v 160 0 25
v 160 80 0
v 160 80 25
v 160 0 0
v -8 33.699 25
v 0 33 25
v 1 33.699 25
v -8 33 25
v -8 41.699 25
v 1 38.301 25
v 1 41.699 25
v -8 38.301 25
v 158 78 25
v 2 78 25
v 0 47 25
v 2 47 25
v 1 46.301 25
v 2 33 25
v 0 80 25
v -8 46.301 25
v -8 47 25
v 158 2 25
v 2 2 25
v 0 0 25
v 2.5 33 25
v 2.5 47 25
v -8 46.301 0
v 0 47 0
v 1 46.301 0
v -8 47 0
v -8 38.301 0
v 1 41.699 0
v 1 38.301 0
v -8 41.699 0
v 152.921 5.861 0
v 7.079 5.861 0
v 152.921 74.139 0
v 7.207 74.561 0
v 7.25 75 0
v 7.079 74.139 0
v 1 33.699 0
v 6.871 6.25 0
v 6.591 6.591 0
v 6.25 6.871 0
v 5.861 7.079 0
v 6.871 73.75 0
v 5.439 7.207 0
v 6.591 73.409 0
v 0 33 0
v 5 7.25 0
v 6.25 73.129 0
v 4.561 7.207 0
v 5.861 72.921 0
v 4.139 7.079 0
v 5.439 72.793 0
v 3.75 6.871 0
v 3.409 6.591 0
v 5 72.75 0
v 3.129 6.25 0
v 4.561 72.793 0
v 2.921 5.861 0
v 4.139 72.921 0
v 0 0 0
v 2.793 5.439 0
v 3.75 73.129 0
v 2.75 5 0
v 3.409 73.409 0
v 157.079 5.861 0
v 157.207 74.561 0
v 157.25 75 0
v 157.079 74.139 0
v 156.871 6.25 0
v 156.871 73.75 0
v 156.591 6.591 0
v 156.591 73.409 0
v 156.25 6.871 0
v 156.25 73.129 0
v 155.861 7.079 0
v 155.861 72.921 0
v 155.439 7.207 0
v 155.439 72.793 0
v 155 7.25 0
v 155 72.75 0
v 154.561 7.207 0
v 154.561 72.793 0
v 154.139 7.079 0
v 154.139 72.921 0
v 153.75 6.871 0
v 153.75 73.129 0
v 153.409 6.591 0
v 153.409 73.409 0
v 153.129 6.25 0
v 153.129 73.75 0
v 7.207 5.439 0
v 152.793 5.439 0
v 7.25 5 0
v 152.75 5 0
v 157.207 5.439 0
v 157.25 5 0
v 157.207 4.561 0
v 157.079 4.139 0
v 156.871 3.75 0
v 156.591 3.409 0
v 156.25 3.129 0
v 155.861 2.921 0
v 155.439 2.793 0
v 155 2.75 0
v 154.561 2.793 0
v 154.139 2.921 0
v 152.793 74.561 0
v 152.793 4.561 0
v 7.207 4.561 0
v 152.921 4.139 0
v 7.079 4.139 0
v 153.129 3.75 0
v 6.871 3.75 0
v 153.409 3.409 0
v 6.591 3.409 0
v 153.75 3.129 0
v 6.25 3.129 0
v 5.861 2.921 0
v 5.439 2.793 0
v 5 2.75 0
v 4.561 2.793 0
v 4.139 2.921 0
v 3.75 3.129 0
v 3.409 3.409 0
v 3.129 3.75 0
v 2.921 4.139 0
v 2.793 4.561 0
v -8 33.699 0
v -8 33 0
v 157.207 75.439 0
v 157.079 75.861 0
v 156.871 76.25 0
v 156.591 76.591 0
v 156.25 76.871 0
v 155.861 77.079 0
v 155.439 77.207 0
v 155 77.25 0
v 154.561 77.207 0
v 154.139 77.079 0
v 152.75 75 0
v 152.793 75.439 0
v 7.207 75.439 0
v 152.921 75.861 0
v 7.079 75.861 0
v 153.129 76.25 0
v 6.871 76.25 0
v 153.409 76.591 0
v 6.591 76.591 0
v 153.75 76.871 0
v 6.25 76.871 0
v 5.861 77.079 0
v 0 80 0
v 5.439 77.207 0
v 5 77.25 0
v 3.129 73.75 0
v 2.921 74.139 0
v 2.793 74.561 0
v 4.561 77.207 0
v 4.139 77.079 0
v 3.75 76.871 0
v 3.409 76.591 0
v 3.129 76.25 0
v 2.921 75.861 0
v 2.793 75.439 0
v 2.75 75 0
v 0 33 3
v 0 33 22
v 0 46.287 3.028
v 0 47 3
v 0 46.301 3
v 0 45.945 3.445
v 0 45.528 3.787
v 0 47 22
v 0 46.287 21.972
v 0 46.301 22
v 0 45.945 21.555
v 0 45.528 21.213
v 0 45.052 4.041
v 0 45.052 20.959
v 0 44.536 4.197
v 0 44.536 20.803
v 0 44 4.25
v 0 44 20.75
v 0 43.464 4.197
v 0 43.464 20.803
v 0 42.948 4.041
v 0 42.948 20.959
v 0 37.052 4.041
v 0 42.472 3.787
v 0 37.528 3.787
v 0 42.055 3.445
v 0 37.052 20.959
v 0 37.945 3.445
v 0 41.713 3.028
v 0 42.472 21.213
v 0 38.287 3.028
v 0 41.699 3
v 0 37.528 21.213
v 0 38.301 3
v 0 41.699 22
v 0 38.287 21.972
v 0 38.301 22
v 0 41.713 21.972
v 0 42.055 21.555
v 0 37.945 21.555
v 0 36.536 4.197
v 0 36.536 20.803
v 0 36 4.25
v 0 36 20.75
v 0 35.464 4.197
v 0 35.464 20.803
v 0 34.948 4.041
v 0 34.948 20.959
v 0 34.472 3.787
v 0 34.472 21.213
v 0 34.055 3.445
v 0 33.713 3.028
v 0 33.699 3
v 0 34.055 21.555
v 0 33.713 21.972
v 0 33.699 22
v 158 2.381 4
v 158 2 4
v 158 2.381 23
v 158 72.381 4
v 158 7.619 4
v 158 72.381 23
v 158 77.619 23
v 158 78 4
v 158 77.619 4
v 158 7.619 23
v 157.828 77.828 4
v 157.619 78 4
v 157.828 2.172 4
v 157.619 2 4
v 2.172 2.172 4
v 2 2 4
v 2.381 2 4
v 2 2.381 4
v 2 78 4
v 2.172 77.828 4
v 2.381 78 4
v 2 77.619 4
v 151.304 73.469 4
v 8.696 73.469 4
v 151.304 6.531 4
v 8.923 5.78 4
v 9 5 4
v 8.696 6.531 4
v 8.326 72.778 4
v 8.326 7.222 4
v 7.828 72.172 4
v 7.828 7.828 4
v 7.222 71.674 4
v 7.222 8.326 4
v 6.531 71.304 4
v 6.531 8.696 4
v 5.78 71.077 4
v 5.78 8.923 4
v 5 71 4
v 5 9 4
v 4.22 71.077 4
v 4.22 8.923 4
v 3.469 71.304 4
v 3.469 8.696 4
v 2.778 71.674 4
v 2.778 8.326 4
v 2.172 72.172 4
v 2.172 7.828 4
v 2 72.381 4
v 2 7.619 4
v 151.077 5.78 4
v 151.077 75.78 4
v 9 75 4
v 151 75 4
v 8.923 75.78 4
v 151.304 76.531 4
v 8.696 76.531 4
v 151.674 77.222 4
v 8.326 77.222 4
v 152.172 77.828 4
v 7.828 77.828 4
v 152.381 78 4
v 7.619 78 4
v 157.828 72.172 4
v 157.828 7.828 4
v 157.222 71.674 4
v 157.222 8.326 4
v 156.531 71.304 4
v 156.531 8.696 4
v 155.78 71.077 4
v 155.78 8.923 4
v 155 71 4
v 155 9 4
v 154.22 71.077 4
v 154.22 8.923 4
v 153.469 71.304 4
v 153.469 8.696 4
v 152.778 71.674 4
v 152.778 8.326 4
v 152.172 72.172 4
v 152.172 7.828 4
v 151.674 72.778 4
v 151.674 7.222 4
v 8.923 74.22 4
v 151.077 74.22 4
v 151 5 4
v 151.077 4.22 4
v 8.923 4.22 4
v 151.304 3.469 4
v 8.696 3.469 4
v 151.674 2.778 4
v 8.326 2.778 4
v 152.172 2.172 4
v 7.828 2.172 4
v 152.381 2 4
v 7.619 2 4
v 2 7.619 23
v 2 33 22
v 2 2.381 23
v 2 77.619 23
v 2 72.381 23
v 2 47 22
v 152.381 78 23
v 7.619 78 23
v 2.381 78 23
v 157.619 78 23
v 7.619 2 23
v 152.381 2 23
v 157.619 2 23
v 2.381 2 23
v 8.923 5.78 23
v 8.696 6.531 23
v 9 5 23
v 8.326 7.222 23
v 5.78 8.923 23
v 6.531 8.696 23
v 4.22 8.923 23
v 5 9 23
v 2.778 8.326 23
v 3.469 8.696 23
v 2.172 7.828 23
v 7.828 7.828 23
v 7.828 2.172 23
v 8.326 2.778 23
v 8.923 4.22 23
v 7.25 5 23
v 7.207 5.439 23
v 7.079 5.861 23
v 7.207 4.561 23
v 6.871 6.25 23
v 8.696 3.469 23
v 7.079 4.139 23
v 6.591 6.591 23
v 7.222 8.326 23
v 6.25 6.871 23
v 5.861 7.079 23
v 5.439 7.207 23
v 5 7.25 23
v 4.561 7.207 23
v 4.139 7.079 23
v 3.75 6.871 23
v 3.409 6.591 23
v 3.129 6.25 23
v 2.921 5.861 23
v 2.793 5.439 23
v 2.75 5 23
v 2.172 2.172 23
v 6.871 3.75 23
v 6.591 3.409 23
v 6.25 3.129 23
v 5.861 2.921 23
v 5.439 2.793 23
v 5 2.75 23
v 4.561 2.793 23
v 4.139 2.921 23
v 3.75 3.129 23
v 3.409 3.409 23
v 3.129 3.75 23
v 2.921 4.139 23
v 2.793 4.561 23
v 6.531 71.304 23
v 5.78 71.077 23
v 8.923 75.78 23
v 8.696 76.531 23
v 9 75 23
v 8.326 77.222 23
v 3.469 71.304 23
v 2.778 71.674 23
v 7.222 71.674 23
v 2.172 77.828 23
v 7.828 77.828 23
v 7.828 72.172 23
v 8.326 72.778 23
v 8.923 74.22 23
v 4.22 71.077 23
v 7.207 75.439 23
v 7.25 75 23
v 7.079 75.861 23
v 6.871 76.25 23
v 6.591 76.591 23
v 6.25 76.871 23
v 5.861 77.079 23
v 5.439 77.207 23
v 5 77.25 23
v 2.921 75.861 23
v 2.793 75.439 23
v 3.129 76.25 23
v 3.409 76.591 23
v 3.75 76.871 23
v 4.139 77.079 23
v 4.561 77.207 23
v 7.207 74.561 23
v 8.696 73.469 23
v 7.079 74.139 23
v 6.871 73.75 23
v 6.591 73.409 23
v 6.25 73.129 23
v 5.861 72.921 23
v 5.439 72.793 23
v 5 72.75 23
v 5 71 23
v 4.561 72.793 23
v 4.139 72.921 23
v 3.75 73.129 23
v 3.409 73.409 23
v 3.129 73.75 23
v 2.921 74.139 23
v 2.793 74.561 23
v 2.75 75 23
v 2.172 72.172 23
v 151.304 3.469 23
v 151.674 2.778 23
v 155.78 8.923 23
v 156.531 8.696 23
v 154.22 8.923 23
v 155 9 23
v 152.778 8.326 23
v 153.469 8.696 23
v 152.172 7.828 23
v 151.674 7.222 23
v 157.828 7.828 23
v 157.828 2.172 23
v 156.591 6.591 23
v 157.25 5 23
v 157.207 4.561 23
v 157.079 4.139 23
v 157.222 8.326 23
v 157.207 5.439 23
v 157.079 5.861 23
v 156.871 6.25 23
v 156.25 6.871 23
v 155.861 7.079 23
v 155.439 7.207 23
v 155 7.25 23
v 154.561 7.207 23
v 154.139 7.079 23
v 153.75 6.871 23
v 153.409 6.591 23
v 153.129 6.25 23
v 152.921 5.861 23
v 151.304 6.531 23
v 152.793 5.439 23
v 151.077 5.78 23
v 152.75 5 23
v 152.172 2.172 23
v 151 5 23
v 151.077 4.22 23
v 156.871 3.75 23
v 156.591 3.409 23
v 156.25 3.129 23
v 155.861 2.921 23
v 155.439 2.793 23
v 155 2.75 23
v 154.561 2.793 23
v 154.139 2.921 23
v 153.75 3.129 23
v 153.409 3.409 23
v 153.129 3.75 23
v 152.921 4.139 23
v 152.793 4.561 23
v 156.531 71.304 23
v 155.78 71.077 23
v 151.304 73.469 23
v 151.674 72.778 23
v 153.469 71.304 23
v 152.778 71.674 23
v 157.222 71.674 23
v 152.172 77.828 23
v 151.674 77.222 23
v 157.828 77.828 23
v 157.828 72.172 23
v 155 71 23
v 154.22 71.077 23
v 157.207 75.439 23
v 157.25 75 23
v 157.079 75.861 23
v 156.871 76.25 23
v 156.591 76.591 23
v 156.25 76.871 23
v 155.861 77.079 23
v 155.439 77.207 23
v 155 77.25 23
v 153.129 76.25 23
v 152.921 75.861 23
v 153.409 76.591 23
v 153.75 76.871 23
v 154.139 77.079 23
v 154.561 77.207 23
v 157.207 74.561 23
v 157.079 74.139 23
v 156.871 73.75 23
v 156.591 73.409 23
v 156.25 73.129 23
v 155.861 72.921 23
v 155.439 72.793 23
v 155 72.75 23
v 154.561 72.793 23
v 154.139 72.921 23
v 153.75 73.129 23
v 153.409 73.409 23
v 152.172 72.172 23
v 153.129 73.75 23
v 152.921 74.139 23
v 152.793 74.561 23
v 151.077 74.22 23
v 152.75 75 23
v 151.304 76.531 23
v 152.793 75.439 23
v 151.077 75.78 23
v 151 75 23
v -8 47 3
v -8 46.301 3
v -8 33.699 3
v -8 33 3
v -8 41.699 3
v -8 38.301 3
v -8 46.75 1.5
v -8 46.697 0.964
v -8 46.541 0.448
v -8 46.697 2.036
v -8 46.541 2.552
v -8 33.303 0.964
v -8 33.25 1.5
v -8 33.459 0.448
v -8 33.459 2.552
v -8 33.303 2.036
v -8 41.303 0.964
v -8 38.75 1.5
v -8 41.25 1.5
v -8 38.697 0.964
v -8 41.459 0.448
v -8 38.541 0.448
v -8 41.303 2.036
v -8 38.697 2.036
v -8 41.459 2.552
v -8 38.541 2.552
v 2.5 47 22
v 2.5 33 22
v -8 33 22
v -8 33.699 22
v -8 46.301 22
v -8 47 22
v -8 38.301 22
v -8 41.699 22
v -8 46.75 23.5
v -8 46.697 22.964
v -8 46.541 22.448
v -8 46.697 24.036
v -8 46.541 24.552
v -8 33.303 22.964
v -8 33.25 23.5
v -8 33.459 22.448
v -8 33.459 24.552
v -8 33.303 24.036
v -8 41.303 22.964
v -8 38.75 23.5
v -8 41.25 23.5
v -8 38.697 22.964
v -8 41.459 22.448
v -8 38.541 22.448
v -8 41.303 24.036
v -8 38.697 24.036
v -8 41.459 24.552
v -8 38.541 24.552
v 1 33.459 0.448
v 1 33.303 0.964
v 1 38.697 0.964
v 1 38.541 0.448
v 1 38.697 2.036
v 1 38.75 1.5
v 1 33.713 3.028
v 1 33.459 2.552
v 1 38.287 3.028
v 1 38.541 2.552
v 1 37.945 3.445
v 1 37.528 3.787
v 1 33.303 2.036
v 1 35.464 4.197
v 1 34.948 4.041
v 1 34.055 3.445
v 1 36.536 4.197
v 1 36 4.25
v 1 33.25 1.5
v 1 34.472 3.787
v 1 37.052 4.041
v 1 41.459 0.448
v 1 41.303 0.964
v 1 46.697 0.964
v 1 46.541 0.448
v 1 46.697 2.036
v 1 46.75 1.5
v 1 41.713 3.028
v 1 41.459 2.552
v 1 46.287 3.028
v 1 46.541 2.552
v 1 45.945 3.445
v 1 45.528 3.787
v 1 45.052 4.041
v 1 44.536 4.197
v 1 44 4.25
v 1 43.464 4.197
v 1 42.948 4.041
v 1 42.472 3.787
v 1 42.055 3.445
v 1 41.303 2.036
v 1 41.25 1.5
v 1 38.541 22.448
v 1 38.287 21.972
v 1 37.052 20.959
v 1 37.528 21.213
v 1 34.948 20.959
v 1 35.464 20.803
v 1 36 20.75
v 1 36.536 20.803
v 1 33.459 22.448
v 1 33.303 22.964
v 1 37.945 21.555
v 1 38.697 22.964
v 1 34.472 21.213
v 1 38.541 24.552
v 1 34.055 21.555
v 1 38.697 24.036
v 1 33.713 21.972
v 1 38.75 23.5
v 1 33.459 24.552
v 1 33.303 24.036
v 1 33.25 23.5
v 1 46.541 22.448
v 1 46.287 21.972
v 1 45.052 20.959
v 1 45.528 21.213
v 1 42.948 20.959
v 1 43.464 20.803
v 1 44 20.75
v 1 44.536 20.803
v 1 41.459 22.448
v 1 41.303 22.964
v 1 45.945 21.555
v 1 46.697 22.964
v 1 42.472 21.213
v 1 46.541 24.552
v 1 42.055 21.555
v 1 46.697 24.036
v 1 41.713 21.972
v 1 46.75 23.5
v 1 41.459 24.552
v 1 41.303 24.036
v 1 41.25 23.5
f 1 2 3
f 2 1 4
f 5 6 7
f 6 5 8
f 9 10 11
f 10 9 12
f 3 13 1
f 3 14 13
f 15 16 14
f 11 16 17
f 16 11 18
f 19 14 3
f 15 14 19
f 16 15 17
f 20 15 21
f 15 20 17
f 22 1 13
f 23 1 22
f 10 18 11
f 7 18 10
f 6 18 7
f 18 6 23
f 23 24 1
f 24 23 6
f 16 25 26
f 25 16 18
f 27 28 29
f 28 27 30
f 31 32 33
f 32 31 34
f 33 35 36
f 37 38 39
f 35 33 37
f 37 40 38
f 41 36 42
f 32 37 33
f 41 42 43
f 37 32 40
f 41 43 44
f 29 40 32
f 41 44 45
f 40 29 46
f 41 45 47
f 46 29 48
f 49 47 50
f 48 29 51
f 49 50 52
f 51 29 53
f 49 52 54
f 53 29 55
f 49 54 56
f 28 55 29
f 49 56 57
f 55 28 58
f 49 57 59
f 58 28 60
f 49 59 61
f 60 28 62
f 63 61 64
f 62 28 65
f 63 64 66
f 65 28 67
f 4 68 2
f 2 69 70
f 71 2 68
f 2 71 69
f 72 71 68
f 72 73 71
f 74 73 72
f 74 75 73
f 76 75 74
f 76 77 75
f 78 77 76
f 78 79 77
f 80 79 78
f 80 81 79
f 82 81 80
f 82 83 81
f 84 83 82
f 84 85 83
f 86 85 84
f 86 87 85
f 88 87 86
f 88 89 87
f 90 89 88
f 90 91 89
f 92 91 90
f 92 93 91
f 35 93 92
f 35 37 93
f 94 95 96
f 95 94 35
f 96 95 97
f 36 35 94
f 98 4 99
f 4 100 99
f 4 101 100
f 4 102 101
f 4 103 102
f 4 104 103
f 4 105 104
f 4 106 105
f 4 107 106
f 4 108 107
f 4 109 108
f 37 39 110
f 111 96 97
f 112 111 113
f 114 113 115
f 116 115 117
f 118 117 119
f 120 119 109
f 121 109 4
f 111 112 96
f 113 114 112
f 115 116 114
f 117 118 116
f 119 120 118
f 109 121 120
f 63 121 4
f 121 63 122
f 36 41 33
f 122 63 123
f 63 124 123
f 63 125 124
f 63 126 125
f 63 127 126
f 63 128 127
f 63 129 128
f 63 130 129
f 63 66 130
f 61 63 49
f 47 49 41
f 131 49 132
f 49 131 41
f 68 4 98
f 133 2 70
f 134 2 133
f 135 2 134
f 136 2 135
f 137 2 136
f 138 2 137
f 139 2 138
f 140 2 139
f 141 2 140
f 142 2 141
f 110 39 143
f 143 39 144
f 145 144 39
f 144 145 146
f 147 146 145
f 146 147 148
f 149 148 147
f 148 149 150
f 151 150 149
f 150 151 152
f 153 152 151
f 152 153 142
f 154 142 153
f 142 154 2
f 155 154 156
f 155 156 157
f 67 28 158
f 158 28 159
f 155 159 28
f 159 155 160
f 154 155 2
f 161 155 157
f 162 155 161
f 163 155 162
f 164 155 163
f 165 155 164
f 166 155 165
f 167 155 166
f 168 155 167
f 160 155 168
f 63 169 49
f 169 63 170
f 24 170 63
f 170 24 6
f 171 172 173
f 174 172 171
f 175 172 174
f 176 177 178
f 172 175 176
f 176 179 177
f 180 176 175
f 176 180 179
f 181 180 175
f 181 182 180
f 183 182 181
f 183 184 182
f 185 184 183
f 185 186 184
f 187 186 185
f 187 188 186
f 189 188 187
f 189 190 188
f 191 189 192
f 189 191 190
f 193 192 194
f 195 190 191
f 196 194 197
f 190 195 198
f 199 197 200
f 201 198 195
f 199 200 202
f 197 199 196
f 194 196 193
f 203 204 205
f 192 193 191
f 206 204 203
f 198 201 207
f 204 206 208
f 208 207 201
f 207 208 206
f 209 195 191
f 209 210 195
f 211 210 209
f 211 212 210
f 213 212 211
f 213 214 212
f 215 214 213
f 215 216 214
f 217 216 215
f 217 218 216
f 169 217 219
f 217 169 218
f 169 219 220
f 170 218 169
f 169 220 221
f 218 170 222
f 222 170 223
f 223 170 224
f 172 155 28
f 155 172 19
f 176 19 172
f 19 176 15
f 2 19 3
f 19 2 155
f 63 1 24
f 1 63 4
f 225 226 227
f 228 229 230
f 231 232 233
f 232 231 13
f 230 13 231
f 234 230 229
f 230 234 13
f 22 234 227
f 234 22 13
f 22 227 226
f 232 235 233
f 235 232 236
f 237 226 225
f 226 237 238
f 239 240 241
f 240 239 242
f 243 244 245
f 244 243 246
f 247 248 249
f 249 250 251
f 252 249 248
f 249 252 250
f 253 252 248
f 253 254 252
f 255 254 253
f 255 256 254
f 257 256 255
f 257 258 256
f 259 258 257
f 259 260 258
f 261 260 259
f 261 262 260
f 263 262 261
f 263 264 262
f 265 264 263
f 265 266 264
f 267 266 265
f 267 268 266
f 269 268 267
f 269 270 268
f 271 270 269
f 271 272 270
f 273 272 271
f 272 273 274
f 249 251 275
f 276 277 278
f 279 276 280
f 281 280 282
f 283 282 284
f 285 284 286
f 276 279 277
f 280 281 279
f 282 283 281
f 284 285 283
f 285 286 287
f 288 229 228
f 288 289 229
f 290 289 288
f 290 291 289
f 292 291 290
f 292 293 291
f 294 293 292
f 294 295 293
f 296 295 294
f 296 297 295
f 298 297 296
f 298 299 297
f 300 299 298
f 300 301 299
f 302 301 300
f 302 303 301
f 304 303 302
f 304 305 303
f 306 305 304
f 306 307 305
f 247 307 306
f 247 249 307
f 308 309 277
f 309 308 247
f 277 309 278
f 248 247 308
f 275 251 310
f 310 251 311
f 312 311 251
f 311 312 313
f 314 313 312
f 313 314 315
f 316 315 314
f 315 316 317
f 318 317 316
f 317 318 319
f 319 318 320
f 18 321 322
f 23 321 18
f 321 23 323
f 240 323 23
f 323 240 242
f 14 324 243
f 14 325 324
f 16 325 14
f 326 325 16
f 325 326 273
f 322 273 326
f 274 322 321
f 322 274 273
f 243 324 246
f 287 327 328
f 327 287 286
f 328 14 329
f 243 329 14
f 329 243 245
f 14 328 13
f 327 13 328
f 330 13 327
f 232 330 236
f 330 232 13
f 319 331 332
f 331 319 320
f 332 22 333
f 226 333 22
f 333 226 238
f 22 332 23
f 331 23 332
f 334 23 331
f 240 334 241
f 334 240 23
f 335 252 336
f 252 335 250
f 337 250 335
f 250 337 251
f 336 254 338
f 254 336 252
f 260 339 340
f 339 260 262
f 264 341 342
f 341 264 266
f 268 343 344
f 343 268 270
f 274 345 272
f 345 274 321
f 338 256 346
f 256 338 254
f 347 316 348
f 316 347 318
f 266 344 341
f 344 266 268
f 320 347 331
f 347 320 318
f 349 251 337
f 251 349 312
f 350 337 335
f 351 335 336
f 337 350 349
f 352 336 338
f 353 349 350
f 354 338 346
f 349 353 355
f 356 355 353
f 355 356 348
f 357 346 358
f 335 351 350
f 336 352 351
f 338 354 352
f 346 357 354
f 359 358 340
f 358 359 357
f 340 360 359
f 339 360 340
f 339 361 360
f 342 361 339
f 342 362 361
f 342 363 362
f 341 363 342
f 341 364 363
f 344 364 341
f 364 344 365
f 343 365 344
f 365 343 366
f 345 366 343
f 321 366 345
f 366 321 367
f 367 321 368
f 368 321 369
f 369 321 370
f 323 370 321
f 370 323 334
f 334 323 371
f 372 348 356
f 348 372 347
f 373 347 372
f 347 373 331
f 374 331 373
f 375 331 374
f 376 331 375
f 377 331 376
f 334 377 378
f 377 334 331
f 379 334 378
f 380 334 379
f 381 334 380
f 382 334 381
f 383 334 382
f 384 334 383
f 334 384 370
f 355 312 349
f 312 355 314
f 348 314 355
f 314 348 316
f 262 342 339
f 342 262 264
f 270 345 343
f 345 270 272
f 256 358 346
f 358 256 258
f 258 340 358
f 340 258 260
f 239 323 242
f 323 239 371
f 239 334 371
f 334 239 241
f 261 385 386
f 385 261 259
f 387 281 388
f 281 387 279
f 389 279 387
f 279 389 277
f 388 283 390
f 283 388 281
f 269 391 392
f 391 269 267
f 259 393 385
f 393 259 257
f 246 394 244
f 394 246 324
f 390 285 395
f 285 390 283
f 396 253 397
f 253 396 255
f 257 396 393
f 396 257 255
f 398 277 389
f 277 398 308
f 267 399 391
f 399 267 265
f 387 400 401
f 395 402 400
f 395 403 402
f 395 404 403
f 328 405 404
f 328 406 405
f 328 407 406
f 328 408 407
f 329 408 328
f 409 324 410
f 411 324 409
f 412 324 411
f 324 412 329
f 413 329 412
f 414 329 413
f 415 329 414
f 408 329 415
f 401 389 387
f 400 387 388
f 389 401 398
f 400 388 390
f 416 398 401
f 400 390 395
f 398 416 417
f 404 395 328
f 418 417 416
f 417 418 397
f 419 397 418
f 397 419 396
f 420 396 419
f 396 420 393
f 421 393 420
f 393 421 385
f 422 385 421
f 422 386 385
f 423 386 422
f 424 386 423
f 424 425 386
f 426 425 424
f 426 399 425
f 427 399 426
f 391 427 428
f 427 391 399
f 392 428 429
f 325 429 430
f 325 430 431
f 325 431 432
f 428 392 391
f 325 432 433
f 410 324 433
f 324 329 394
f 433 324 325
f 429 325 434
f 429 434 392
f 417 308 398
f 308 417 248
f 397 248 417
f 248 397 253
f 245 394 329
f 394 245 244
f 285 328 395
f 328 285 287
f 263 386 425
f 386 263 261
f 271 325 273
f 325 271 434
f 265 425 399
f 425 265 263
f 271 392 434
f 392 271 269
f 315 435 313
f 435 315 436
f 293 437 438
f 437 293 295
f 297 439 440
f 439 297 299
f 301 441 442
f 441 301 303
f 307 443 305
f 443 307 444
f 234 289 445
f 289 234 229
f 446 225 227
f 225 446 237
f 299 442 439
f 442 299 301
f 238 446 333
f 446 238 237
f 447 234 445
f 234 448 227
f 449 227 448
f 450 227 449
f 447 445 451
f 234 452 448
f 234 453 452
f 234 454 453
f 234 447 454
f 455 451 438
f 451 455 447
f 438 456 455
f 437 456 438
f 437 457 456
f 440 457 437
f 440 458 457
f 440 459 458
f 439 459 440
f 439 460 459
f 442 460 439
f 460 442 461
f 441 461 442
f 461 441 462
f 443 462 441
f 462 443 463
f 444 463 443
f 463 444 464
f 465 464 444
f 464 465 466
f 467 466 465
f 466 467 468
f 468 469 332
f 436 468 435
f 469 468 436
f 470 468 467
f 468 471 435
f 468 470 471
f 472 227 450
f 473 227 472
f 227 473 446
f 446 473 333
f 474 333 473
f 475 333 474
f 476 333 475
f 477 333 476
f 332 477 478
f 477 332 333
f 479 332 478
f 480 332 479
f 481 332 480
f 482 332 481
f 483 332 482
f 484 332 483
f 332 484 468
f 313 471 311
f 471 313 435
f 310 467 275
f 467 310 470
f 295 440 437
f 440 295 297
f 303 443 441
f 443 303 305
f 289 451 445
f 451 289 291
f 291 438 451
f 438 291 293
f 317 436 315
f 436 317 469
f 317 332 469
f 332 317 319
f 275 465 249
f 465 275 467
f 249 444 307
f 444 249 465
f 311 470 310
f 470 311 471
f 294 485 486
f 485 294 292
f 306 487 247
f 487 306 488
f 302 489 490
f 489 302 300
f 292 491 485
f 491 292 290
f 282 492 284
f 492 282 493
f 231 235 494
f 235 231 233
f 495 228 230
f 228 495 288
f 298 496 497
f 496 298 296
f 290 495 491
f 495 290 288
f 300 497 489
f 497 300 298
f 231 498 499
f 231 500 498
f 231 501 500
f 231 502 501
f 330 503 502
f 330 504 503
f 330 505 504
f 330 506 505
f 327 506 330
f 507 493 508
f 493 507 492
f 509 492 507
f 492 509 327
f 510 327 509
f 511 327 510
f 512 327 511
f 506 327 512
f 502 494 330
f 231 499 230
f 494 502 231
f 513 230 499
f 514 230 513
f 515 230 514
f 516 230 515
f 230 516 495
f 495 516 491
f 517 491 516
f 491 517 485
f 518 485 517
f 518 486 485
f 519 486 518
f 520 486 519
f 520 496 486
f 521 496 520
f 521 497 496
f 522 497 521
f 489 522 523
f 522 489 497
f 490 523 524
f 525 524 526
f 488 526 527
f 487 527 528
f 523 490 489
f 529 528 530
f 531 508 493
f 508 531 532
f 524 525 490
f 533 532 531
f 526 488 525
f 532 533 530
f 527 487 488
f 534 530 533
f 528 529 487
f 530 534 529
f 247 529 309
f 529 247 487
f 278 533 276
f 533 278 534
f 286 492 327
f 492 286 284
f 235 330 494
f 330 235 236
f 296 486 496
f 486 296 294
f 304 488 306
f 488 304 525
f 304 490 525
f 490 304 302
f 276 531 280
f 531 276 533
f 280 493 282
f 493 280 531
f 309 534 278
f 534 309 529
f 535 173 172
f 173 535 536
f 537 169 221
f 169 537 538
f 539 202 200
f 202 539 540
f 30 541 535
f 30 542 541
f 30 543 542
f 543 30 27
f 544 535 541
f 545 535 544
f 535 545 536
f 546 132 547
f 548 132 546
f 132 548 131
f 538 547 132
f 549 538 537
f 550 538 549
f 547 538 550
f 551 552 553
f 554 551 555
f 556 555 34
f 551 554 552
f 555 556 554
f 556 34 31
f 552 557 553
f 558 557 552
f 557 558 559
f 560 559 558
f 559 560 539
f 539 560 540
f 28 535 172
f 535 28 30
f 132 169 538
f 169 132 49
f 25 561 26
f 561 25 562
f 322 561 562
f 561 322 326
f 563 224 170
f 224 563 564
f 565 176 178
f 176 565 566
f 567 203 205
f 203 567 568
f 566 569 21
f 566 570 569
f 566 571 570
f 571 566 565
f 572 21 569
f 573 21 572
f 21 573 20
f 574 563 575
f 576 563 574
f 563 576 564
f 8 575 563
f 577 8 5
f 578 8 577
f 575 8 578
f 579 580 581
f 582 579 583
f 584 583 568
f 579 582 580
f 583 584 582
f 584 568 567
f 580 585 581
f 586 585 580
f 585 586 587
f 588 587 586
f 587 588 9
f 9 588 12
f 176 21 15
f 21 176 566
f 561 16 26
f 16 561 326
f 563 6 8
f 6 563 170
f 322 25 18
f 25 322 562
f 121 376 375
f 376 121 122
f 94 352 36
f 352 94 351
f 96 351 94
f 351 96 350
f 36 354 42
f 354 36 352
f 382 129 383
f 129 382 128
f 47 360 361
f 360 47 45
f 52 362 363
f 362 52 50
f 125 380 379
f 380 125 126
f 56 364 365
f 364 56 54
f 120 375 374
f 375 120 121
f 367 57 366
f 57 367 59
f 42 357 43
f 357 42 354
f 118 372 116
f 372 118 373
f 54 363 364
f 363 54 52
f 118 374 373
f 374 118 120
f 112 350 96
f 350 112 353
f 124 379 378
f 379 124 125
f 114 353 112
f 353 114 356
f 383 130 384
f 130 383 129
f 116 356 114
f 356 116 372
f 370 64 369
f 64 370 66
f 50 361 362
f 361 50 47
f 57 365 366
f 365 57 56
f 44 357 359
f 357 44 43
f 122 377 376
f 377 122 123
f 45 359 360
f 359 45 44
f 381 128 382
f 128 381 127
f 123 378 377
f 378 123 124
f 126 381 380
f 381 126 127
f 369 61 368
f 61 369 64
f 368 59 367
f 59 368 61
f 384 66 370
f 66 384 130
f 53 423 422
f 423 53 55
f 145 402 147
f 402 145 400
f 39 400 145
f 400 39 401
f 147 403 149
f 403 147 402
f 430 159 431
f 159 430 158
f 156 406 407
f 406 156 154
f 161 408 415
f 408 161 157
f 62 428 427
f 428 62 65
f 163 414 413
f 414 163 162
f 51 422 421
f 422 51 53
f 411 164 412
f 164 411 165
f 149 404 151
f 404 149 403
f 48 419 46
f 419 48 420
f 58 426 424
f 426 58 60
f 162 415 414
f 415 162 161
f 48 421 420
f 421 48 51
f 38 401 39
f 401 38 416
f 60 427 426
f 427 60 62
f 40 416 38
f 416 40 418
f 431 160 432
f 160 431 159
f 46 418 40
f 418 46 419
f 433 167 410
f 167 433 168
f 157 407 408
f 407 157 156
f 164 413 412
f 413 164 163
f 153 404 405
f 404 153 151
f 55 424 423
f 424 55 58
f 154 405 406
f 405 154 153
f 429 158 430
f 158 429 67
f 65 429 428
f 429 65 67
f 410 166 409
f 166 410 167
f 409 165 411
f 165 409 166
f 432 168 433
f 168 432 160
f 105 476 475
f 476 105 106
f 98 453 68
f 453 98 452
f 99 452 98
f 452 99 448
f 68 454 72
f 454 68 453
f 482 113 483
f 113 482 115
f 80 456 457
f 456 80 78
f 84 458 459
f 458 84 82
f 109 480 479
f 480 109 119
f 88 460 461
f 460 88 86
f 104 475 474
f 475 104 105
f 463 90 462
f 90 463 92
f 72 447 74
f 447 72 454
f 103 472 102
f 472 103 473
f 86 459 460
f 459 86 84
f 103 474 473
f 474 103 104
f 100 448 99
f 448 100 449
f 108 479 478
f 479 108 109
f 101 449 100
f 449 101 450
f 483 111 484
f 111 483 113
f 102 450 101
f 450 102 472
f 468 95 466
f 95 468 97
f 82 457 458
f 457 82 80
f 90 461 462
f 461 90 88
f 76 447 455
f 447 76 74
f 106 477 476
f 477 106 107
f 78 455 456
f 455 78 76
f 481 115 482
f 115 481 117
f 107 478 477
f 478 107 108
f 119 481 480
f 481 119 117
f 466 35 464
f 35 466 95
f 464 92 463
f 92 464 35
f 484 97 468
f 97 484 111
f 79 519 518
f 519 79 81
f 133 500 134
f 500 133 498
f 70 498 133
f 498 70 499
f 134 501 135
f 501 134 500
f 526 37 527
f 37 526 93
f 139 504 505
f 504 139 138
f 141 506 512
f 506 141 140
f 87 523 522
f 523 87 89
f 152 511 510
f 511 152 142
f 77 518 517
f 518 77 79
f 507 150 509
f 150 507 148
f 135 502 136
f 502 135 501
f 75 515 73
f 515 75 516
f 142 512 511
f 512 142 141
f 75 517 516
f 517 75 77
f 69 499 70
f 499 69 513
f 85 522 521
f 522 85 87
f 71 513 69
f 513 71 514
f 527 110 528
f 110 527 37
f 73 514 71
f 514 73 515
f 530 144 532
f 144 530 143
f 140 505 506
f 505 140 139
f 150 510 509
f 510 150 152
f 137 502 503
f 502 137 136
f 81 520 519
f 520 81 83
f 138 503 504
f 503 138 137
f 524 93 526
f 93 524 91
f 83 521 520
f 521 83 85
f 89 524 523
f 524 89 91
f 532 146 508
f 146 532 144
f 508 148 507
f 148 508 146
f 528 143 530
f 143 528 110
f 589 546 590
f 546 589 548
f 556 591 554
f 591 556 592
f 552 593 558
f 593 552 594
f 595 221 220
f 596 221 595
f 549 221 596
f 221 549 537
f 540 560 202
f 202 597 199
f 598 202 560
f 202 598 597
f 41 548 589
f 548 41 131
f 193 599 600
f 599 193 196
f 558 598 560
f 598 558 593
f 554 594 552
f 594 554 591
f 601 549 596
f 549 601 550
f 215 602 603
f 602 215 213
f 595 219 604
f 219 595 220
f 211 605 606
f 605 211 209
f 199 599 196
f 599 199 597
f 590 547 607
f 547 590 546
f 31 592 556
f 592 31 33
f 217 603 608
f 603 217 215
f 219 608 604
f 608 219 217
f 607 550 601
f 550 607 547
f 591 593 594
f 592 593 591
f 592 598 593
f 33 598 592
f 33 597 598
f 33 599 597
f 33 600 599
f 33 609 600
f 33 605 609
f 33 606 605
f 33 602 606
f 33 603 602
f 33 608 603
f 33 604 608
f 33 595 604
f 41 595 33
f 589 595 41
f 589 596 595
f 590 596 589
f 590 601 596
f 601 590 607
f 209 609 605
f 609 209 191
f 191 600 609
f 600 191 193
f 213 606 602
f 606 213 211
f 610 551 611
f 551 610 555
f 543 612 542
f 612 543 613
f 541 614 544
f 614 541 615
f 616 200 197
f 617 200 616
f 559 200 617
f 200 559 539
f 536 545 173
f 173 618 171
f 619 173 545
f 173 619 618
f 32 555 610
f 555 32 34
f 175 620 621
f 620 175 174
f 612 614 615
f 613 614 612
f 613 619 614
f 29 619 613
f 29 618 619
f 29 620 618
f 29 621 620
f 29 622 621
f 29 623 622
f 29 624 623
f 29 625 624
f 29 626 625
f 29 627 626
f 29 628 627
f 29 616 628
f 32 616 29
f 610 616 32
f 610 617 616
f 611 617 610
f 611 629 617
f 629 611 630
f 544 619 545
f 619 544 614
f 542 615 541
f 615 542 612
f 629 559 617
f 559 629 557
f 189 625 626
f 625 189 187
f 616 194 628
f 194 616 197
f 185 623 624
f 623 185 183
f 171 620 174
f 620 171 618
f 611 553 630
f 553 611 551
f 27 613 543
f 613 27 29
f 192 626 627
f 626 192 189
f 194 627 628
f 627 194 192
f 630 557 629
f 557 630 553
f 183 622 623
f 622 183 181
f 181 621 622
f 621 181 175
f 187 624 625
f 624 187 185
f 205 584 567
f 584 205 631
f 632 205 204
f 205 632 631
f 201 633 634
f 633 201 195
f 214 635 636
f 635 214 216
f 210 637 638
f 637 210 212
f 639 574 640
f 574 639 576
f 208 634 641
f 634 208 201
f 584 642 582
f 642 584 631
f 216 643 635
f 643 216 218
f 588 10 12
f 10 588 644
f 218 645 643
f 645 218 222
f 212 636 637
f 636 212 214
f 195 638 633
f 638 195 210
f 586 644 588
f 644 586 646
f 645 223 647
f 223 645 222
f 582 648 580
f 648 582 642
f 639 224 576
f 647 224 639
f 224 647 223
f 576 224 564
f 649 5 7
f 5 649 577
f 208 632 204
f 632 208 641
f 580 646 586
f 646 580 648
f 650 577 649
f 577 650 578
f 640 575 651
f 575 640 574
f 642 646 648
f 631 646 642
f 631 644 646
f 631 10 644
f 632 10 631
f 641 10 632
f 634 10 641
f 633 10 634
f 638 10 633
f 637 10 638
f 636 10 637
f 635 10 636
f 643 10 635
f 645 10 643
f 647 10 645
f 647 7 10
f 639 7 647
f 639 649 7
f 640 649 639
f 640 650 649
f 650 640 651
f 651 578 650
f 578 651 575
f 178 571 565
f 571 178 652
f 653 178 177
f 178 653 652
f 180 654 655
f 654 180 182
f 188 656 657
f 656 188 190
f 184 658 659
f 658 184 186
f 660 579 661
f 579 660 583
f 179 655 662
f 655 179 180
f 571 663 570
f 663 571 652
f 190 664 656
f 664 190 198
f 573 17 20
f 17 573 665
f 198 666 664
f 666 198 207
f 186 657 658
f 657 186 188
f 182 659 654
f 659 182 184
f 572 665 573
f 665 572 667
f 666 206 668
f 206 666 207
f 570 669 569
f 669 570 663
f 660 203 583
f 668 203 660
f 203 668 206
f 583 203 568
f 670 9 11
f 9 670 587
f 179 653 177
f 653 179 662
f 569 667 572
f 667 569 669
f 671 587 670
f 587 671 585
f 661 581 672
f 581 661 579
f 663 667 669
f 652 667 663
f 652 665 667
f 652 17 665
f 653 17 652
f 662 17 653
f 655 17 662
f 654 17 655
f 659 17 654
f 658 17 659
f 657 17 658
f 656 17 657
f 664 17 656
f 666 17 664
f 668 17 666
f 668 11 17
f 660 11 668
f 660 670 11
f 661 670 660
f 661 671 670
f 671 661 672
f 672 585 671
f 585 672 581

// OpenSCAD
$fn = 32;

// ----------------------------------------------------------------------
// Enclosure body: 160 x 80 x 25 mm, wall 2 mm
// ----------------------------------------------------------------------

// --- parameters (mm) ---
length = 160;             // outside length, X
width = 80;               // outside width, Y
height = 25;              // outside height, Z
wall = 2;                 // side wall thickness
floor_t = 4;              // floor thickness
boss_d = 8;               // corner boss diameter
boss_h = 19;              // corner boss height above the floor
boss_hole_d = 4.5;        // lid screw clearance in the boss
boss_lip = 5;             // boss centre inset from the corner
ear_w = 14;               // mounting ear width
ear_t = 3;                // mounting ear thickness
ear_ext = 8;              // mounting ear reach
ear_hole_d = 5.5;         // mounting ear drills

module shell() {
  difference() {
    cube([length, width, height]);
    /* hollow, open at the top */
    translate([wall, wall, floor_t])
      cube([length - 2 * wall, width - 2 * wall, height]);
  }
}

module bosses() {
  /* corner bosses, sunk 1 mm into the floor */
  for (sx = [0, 1]) for (sy = [0, 1])
    translate([sx * (length - 2 * boss_lip) + boss_lip, sy * (width - 2 * boss_lip) + boss_lip, floor_t - 1])
      cylinder(h = boss_h + 1, d = boss_d);
}

module ears() {
  /* mounting ears on the short walls, sunk into the wall */
  for (sz = [0, 1])
    translate([-ear_ext, width / 2 - ear_w / 2, sz * (height - ear_t)])
      cube([ear_ext + 2.5, ear_w, ear_t]);
}

difference() {
  union() {
    shell();
    bosses();
    ears();
  }
  /* boss screw holes */
  for (sx = [0, 1]) for (sy = [0, 1])
    translate([sx * (length - 2 * boss_lip) + boss_lip, sy * (width - 2 * boss_lip) + boss_lip, -1]) cylinder(h = floor_t + boss_h + 2, d = boss_hole_d);
  for (sz = [0, 1]) for (sx = [0, 1]) translate([-ear_ext - 1, width / 2 + (2 * sx - 1) * (ear_w / 2 - 3), sz * (height - ear_t) + ear_t / 2]) rotate([0, 90, 0]) cylinder(h = ear_ext + 2, d = ear_hole_d);
}
